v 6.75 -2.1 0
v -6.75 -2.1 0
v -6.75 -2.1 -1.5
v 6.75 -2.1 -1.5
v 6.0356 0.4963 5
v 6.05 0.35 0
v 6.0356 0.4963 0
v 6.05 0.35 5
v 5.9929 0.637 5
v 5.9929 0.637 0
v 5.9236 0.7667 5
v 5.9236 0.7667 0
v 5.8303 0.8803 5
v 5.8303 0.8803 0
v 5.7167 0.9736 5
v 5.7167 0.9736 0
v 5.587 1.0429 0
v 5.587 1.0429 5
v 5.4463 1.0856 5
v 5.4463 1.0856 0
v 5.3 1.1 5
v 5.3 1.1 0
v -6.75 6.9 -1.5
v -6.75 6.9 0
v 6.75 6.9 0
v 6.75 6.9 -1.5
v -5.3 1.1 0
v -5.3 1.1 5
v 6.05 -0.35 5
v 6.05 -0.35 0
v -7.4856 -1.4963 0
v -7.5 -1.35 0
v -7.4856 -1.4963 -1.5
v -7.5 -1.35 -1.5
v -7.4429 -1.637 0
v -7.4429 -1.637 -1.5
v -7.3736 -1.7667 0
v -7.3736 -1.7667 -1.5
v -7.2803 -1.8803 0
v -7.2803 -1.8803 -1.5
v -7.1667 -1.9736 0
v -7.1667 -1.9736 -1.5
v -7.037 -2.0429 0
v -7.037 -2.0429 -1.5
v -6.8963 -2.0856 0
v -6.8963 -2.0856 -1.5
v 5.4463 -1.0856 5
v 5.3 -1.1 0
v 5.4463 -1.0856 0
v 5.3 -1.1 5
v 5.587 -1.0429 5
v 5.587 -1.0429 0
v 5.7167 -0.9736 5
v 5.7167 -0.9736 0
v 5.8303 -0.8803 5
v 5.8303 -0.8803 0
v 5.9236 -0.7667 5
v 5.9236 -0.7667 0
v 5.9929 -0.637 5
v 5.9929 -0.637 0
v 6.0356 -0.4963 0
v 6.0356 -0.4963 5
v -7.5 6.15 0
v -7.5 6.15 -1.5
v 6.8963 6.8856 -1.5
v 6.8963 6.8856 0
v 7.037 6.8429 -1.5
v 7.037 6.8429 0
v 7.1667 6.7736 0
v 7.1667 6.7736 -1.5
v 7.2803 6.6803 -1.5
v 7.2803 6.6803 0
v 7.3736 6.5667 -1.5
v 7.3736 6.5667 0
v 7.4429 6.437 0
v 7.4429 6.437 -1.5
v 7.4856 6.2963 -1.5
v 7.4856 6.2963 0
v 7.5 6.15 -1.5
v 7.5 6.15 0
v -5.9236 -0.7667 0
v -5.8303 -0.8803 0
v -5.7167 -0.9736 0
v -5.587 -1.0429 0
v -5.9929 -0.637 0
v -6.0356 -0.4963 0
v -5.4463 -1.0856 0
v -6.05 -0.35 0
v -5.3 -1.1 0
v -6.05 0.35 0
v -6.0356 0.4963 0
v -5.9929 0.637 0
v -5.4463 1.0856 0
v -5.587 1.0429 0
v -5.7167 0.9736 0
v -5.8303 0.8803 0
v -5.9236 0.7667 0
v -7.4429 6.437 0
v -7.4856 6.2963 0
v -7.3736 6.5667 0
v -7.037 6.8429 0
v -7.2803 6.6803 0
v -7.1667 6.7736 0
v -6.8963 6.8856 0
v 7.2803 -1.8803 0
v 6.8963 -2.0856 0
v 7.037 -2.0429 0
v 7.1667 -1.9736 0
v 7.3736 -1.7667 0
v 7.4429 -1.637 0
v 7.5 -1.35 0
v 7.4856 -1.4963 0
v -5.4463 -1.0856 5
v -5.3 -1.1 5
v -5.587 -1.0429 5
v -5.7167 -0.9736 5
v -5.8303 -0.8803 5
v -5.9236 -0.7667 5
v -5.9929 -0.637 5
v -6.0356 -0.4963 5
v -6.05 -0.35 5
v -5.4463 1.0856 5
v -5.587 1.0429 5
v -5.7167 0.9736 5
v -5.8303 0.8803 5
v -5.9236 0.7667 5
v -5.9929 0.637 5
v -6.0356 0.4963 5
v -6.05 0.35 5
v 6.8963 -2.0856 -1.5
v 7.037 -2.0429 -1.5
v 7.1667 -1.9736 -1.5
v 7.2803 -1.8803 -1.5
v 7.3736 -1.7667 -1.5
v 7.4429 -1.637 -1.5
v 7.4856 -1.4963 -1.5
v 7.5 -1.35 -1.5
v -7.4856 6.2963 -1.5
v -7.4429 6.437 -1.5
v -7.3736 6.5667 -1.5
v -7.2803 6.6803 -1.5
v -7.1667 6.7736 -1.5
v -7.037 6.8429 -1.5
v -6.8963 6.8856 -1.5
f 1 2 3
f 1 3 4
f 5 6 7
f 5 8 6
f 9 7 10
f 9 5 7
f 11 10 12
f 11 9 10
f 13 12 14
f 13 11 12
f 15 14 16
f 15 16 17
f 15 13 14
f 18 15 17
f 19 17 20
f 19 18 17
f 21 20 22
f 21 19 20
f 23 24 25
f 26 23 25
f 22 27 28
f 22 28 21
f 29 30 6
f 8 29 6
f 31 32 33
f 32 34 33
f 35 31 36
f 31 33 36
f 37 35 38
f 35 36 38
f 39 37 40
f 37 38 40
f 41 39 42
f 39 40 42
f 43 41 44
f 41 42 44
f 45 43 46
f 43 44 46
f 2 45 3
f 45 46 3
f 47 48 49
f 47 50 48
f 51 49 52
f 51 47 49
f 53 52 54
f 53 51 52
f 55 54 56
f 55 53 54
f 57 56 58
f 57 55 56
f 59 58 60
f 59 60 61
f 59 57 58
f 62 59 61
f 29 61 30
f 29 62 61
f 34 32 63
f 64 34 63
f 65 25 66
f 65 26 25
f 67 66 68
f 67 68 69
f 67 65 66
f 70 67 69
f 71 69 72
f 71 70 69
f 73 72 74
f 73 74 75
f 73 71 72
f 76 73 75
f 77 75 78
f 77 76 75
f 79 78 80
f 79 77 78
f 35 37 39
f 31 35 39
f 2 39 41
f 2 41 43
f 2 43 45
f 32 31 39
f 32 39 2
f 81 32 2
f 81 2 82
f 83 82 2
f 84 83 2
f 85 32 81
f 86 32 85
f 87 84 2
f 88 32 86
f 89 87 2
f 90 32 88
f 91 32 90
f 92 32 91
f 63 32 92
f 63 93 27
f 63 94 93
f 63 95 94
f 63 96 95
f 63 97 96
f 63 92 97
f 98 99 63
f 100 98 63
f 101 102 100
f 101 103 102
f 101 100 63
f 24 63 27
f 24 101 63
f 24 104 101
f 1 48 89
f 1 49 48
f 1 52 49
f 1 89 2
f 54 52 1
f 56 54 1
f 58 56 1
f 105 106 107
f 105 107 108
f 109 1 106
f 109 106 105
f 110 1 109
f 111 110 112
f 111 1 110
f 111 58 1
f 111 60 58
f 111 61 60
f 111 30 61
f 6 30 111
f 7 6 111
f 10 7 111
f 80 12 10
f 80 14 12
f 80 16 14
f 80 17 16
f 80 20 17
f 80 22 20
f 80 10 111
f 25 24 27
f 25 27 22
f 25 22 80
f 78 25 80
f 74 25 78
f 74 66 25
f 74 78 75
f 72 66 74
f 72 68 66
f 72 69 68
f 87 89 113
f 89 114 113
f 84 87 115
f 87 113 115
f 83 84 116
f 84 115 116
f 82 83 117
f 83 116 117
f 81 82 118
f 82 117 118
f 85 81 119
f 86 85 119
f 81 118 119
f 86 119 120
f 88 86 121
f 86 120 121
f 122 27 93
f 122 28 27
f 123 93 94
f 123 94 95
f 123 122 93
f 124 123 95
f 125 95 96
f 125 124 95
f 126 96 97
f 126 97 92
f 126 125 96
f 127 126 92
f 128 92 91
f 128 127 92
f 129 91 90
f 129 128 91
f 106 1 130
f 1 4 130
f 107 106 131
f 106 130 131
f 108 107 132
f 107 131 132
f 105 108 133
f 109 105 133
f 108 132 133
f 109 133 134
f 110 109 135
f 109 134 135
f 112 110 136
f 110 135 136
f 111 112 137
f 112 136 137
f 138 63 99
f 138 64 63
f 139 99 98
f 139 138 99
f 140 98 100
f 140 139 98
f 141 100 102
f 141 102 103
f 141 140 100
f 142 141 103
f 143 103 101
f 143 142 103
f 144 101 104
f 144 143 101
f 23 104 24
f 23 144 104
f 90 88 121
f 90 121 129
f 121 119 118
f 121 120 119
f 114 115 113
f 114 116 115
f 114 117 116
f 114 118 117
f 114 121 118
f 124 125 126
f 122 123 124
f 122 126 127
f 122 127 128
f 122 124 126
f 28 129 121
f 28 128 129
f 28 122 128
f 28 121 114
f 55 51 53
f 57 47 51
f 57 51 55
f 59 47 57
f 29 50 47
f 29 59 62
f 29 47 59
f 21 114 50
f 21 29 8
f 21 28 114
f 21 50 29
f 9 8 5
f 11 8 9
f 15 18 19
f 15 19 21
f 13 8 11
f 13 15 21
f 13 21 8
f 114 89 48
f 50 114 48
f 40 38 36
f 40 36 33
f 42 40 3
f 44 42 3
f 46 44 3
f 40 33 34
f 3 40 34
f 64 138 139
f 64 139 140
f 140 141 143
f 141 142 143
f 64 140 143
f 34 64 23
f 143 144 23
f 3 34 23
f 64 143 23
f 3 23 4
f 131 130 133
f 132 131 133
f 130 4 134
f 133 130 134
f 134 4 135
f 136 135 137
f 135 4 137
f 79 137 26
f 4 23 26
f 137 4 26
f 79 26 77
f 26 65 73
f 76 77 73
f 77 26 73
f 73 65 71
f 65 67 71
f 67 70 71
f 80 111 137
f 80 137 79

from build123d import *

# Parameters (mm, degrees)
F0_W     = 12.1
F0_H     = 2.2
F1_DEPTH = 5
F0_W_2   = 15
F0_H_2   = 9
F2_DEPTH = 1.5
F3_R     = 0.75


with BuildPart() as f1:
    # F0 (on Top) → F1 (new body)
    with BuildSketch(Plane.XY):
        Rectangle(F0_W, F0_H)
    extrude(amount=F1_DEPTH)

    # F0 (on Top) → F2 (join)
    with BuildSketch(Plane.XY):
        with Locations((0, 2.4)):
            Rectangle(F0_W_2, F0_H_2)
        Rectangle(F0_W, F0_H, mode=Mode.SUBTRACT)
        Rectangle(F0_W, F0_H)
    extrude(amount=-F2_DEPTH)

    # F3
    f3_edges = [f1.edges().sort_by_distance(p)[0] for p in [
        (-6.05, 1.1, 2.5),
        (-6.05, -1.1, 2.5),
        (6.05, 1.1, 2.5),
        (6.05, -1.1, 2.5),
        (7.5, -2.1, -0.75),
        (7.5, 6.9, -0.75),
        (-7.5, 6.9, -0.75),
        (-7.5, -2.1, -0.75),
    ]]
    fillet(f3_edges, radius=F3_R)


solid = f1.part
